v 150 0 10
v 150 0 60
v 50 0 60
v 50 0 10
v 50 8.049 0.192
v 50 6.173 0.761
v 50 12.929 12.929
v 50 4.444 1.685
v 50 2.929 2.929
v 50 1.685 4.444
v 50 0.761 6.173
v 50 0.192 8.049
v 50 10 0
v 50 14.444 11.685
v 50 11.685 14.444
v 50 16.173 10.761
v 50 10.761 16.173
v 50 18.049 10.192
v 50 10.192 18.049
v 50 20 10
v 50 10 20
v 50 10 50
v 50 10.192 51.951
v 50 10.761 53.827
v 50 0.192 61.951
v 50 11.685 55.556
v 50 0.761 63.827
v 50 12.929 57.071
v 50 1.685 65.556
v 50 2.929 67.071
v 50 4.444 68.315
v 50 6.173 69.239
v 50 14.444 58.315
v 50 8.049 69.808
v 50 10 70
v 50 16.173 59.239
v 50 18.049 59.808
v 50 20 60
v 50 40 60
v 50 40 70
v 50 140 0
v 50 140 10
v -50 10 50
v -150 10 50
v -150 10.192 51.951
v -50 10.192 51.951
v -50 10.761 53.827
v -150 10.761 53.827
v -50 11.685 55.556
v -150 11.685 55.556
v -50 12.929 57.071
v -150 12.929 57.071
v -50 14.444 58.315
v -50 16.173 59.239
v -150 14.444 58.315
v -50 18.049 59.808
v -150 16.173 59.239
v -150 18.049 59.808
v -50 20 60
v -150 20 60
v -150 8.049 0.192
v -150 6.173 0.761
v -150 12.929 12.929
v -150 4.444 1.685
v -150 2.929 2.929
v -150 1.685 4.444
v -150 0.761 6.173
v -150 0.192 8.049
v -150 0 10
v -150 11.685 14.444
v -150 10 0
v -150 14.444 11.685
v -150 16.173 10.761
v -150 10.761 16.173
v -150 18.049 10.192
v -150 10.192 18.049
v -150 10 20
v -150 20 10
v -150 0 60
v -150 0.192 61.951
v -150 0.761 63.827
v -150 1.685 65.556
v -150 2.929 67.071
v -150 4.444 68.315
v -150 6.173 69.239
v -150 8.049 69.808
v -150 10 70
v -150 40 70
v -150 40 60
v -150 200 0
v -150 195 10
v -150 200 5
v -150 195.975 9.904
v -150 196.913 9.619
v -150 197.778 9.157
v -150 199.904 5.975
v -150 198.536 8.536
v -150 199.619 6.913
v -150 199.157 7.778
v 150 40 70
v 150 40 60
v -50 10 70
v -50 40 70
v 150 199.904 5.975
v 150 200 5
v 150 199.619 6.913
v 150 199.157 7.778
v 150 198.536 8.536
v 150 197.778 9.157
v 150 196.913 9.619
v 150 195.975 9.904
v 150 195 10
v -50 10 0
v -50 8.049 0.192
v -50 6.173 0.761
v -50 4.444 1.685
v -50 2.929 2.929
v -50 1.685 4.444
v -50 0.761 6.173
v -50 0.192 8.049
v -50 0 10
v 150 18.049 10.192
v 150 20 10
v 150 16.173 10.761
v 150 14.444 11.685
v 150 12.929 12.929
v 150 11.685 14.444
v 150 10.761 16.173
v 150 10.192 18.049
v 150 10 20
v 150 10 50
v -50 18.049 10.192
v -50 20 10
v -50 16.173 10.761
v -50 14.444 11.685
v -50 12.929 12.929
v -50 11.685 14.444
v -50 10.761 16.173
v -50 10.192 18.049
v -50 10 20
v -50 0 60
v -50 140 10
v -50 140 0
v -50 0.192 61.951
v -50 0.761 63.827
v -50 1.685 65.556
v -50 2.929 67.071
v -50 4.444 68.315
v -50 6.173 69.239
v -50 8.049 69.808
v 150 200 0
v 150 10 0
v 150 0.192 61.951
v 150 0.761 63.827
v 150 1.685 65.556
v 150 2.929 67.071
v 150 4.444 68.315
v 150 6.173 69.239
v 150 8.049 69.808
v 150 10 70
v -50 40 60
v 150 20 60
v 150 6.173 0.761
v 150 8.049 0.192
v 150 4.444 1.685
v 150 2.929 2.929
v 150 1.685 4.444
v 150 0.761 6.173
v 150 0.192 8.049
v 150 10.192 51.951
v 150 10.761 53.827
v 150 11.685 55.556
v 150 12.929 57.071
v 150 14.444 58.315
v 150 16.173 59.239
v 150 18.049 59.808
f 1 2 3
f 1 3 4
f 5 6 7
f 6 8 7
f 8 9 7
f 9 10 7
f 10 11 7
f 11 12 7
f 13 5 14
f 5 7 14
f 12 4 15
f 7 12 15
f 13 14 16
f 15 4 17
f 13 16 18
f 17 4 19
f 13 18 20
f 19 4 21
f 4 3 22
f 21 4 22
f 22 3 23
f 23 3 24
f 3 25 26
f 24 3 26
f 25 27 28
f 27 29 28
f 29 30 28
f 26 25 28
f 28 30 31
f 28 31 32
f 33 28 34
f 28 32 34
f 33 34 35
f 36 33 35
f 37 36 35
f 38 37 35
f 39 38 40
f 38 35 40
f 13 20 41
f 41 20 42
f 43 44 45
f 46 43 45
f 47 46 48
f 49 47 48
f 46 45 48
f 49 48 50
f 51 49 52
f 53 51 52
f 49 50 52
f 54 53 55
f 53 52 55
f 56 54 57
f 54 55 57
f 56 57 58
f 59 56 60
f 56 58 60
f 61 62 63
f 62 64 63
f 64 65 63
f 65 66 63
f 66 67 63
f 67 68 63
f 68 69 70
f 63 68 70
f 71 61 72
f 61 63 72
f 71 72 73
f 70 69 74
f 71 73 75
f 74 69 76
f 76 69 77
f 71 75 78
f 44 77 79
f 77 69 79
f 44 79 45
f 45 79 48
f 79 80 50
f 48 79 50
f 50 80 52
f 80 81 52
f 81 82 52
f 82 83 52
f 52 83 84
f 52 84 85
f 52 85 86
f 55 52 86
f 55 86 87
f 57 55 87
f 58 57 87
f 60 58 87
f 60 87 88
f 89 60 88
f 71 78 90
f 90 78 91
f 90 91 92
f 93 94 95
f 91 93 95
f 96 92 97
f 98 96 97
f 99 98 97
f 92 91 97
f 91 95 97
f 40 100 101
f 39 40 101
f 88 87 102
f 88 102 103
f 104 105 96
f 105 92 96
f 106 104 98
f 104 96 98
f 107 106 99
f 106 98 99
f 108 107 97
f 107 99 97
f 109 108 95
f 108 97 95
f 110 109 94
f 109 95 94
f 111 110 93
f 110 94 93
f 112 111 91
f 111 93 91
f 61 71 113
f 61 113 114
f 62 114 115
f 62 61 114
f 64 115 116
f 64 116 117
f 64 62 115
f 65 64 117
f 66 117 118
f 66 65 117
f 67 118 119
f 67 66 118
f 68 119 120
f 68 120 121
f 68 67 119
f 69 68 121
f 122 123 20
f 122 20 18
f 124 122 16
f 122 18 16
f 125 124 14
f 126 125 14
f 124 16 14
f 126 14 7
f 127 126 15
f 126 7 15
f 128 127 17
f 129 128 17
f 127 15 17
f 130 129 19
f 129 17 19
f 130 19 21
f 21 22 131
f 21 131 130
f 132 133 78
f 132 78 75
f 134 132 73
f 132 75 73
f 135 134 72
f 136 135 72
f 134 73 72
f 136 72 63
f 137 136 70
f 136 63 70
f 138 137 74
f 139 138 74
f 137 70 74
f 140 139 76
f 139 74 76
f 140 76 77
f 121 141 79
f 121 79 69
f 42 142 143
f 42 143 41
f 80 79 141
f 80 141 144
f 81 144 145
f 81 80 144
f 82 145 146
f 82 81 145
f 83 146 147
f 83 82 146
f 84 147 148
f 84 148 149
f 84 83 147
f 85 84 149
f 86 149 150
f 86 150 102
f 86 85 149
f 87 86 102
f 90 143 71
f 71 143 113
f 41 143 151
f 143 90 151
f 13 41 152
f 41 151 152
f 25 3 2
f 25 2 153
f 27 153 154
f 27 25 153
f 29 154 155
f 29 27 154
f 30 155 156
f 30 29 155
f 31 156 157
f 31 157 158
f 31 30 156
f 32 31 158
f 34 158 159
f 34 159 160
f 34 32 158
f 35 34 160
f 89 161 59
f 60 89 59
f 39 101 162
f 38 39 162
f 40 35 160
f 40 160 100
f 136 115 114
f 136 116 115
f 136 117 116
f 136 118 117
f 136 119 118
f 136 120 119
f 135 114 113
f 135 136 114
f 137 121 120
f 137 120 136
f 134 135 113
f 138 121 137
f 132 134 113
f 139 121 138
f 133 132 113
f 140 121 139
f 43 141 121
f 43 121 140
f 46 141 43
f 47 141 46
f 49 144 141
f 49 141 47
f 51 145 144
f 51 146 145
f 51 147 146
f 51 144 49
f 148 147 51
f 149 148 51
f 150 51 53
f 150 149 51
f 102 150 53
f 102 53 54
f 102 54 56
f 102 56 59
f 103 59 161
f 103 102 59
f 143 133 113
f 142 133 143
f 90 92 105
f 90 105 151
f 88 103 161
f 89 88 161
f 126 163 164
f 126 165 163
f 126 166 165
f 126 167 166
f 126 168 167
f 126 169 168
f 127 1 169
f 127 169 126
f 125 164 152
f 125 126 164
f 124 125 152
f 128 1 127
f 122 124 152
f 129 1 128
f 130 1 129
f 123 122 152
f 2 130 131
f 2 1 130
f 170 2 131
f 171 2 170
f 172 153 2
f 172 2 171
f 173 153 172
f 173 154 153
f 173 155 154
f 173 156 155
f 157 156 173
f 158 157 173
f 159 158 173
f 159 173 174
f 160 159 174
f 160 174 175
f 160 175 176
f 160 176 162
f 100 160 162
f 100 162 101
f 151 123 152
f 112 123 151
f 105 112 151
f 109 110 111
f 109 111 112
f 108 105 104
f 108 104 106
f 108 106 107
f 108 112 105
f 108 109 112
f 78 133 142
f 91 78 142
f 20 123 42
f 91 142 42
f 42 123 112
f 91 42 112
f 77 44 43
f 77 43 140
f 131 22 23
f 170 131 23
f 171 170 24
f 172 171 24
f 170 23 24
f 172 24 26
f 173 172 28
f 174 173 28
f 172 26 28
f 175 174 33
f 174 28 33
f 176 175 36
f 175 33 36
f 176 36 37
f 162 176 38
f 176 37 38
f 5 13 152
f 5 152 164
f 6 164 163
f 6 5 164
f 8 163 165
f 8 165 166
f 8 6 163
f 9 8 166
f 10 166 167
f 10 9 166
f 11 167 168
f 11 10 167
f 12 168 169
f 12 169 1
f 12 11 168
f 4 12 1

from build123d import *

# Parameters (mm, degrees)
BOSS_EXTRUDE2_DEPTH = 150
SKETCH3_W           = 100
SKETCH3_H           = 280
CUT_EXTRUDE3_DEPTH  = 260.615099715
FILLET2_START       = -151
FILLET2_DEPTH       = 302
FILLET2_START_2     = -150
FILLET2_2_DEPTH     = 100
FILLET2_START_3     = 50
FILLET2_3_DEPTH     = 100
FILLET3_R           = 5


with BuildPart() as part:
    # Sketch2 → Boss-Extrude2 (new, symmetric)
    with BuildSketch(Plane(origin=(0, 0, 0), x_dir=(0, 0, -1), z_dir=(1, 0, 0))):
        Polygon((-60, 10), (-10, 10), (-10, 200), (0, 200), (0, 0), (-26, 0), (-70, 0), (-70, 40), (-60, 40), align=None)
    extrude(amount=BOSS_EXTRUDE2_DEPTH, both=True)

    # Sketch3 → Cut-Extrude3 (cut, through all)
    with BuildSketch(Plane.XY.offset(70)):
        Rectangle(SKETCH3_W, SKETCH3_H)
    extrude(amount=-CUT_EXTRUDE3_DEPTH, mode=Mode.SUBTRACT)

    # Fillet2: read off the stored shape, not the designer's step
    # Fillet2 outline → Fillet2 (cut)
    with BuildSketch(Plane.YZ.offset(FILLET2_START)):
        with BuildLine():
            Line((0, 0), (10, 0))
            ThreePointArc((10, 0), (2.928932188, 2.928932188), (0, 10))
            Line((0, 10), (0, 0))
        make_face()
        with BuildLine():
            Line((0, 70), (0, 60))
            ThreePointArc((0, 60), (2.928932188, 67.071067812), (10, 70))
            Line((10, 70), (0, 70))
        make_face()
    extrude(amount=FILLET2_DEPTH, mode=Mode.SUBTRACT)

    # Fillet2 2 outline → Fillet2 2 (add)
    with BuildSketch(Plane.YZ.offset(FILLET2_START_2)):
        with BuildLine():
            Line((10, 60), (10, 50))
            ThreePointArc((10, 50), (12.928932188, 57.071067812), (20, 60))
            Line((20, 60), (10, 60))
        make_face()
        with BuildLine():
            ThreePointArc((20, 10), (12.928932188, 12.928932188), (10, 20))
            Line((10, 20), (10, 10))
            Line((10, 10), (20, 10))
        make_face()
    extrude(amount=FILLET2_2_DEPTH)

    # Fillet2 3 outline → Fillet2 3 (add)
    with BuildSketch(Plane.YZ.offset(FILLET2_START_3)):
        with BuildLine():
            Line((10, 60), (10, 50))
            ThreePointArc((10, 50), (12.928932188, 57.071067812), (20, 60))
            Line((20, 60), (10, 60))
        make_face()
        with BuildLine():
            ThreePointArc((20, 10), (12.928932188, 12.928932188), (10, 20))
            Line((10, 20), (10, 10))
            Line((10, 10), (20, 10))
        make_face()
    extrude(amount=FILLET2_3_DEPTH)

    # Fillet3
    fillet3_edges = [part.edges().sort_by_distance(p)[0] for p in [
        (0, 200, 10),
    ]]
    fillet(fillet3_edges, radius=FILLET3_R)


solid = part.part
